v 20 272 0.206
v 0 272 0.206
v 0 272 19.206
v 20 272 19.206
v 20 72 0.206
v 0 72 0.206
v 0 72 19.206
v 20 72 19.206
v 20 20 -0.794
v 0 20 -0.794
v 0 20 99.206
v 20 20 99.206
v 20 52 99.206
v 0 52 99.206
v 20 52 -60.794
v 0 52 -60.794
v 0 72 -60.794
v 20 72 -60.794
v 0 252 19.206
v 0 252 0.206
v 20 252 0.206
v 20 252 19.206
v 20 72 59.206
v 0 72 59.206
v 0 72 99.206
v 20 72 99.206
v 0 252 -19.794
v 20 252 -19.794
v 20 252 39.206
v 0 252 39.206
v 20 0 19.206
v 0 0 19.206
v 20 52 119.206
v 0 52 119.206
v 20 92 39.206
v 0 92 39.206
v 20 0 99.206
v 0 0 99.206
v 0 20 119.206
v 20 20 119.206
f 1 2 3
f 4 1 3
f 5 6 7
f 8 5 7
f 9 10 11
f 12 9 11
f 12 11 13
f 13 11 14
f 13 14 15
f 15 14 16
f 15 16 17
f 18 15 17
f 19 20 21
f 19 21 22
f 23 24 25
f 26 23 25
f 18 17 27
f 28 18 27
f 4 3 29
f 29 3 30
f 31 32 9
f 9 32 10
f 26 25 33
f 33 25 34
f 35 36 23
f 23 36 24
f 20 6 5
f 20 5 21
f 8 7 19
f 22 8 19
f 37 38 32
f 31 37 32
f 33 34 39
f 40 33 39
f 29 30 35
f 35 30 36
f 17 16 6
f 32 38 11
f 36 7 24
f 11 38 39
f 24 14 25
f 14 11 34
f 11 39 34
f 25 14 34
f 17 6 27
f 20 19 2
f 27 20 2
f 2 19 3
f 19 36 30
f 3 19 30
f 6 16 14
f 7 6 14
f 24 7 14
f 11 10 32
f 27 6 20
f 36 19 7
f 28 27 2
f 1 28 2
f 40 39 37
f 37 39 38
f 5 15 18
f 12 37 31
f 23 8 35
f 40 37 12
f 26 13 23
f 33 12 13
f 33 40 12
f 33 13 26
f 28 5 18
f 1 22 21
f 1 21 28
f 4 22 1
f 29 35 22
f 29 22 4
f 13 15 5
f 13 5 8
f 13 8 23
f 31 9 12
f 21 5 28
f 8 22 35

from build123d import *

# Parameters (mm, degrees)
F0_W     = 180
F0_H     = 19
F1_DEPTH = 20


with BuildPart() as f1:
    # F0 (on Right) → F1 (new body)
    with BuildSketch(Plane.YZ):
        Polygon((52, 99.206252), (52, -60.793748), (72, -60.793748), (252, -19.793748), (272, 0.206252), (272, 19.206252), (252, 39.206252), (92, 39.206252), (72, 59.206252), (72, 99.206252), (52, 119.206252), (20, 119.206252), (0, 99.206252), (0, 19.206252), (20, -0.793748), (20, 99.206252), align=None)
        with Locations((162, 9.706252)):
            Rectangle(F0_W, F0_H, mode=Mode.SUBTRACT)
    extrude(amount=F1_DEPTH)


solid = f1.part
